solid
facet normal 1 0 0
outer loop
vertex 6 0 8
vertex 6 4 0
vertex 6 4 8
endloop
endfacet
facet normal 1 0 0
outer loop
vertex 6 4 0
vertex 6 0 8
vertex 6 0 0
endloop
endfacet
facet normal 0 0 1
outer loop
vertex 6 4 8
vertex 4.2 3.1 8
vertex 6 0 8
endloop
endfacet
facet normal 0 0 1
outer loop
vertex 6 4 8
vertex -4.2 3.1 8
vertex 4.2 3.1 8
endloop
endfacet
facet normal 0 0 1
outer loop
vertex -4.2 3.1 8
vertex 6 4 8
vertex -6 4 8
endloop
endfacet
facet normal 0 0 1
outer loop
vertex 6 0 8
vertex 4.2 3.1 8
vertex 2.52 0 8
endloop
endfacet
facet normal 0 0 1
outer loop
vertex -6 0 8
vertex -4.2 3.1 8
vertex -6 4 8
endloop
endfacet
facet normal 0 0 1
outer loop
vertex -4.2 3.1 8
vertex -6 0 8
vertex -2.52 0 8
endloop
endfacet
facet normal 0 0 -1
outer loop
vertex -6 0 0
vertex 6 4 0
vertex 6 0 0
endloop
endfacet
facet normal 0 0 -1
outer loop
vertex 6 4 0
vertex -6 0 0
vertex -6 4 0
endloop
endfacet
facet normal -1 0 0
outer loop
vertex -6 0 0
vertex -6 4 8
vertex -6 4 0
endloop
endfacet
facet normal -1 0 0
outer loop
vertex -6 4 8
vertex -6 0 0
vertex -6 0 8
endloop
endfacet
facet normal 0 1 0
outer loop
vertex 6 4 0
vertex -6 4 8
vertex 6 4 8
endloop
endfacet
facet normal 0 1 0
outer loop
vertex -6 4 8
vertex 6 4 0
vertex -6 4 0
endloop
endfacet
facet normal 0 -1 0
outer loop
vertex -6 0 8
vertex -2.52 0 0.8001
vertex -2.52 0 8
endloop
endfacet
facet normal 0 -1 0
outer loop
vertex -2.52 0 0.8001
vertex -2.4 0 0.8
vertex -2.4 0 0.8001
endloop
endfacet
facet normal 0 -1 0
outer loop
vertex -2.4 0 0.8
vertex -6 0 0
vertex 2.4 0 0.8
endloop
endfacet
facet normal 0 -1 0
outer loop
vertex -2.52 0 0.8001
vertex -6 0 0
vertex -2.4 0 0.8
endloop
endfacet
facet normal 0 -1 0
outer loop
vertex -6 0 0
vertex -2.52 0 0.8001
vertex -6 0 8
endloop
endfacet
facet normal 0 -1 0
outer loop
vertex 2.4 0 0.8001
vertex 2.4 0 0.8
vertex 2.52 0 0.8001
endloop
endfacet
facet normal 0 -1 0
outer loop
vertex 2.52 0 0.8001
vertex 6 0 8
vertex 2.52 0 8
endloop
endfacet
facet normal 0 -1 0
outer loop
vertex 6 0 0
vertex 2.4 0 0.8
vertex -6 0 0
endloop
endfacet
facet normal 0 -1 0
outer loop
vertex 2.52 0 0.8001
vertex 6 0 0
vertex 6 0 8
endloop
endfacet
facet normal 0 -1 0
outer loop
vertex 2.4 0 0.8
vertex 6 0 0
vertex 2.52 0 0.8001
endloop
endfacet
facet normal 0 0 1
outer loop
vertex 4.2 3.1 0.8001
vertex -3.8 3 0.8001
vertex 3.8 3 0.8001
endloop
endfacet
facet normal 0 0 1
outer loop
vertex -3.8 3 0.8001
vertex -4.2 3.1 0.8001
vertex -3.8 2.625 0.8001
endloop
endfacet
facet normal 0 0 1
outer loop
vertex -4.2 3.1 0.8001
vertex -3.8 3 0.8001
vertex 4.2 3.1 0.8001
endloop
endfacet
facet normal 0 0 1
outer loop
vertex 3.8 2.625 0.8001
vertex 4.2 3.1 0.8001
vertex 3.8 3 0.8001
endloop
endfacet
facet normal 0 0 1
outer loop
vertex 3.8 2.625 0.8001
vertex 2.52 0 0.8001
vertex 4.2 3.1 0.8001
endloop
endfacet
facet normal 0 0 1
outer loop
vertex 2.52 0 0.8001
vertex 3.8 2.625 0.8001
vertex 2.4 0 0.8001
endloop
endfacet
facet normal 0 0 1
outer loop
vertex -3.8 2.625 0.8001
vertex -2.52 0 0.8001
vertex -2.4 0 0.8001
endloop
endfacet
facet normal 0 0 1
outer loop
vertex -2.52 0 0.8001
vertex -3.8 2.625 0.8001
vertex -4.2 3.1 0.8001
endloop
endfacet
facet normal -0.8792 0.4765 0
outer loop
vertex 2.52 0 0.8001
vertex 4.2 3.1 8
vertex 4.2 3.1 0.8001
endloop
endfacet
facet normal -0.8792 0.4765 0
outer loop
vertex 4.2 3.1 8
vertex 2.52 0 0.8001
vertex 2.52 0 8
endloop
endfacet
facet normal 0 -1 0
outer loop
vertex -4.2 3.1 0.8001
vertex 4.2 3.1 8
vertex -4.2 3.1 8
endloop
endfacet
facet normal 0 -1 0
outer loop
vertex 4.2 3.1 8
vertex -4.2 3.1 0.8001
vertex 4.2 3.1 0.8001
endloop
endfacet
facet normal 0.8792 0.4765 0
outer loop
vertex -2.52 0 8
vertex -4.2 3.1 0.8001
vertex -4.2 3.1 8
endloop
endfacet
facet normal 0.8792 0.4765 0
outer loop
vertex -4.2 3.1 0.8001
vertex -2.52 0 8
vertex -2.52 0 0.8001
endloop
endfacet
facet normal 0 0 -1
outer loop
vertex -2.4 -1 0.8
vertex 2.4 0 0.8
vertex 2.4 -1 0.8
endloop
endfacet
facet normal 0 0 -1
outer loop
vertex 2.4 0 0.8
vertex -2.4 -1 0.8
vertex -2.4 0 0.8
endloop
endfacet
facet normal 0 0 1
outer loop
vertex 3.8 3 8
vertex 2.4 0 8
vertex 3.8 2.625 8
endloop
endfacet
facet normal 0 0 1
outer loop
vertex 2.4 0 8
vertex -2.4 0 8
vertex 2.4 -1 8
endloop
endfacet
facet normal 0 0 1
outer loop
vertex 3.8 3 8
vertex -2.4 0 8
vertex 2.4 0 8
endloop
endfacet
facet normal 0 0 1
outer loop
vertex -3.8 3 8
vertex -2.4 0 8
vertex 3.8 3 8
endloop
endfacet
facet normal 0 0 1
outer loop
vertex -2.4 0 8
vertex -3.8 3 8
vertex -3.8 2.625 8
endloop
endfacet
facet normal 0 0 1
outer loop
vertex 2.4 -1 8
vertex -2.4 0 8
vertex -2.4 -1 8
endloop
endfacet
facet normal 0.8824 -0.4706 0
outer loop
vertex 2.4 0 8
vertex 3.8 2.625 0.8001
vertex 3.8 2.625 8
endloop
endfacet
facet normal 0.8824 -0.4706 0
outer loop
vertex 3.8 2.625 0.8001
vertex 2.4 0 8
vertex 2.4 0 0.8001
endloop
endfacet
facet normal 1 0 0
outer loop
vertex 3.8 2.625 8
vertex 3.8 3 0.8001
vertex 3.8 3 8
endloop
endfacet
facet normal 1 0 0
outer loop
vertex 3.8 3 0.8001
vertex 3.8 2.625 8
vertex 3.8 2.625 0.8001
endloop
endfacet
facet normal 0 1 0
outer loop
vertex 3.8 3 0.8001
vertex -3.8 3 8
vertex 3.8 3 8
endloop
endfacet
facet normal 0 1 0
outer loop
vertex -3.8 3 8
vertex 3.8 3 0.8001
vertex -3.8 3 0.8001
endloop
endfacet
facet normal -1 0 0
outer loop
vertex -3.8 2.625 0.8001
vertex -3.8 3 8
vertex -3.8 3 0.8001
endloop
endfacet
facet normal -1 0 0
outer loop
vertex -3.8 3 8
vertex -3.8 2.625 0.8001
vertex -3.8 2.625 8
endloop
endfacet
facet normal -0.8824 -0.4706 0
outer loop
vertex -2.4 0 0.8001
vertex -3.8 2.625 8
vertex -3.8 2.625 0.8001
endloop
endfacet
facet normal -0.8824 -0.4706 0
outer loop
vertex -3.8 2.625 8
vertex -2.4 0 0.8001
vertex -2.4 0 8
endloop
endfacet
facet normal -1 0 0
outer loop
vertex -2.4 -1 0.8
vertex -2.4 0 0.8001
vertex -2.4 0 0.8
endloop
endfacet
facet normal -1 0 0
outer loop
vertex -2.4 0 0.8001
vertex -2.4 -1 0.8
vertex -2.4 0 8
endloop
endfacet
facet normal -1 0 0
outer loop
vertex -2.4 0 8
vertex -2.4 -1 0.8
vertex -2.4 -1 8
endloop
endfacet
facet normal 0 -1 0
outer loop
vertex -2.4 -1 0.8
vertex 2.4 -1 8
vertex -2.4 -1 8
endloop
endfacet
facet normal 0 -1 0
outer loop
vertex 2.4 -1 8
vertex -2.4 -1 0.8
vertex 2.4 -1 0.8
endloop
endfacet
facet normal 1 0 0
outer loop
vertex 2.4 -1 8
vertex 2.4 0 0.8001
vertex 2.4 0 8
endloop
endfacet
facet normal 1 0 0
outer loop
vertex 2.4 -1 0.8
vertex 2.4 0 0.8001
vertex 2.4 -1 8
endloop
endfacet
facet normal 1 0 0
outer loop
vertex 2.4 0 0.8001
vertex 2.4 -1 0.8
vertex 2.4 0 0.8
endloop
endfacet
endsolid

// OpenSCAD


pinDepth = 3;
pinWidth = 8;
tailHeight = 8;

pinWidthFraction = 0.4;
pinHeightFraction = 0.9;

overhangDepth = 1;
overhangWidth = 2;

fitTolerance = 0.4;

cornerTrim = 0.4;

pinOrTail = "both"; // [pin,tail,both]


makeJoint();



module makeJoint()
{
    if( pinOrTail == "pin" )
    {
        DovetailPin( pinDepth, pinWidth, tailHeight, pinWidthFraction, pinHeightFraction, overhangDepth, cornerTrim );
    }
    else if( pinOrTail == "tail" )
    {
        DovetailTail( pinDepth, pinWidth, tailHeight, pinWidthFraction, pinHeightFraction, overhangDepth, overhangWidth, fitTolerance );
    }
    else
    {
        DovetailPin( pinDepth, pinWidth, tailHeight, pinWidthFraction, pinHeightFraction, overhangDepth, cornerTrim );

        DovetailTail( pinDepth, pinWidth, tailHeight, pinWidthFraction, pinHeightFraction, overhangDepth, overhangWidth, fitTolerance );
    }     
}



module DovetailPin( depth,
                    width,
                    height,
                    wedgeWidthFraction,
                    wedgeHeightFraction,
                    overhangDepth,
                    cornerTrim = 0 )
{
    rectangleWidth = width* (1-wedgeWidthFraction);

    //  Compute how much of the corners to trim off to improve fit
    
    angle = atan2((width - rectangleWidth)/2, depth );
    trimmedY = ((( width - rectangleWidth)/2) - cornerTrim ) / tan( angle );
    
    translate([0, depth/2, height*(1-wedgeHeightFraction)])   
    linear_extrude(height*wedgeHeightFraction)
    {
        polygon( points=[[-rectangleWidth/2,-depth/2],
                         [-rectangleWidth/2, -((depth/2) + overhangDepth)],
                         [rectangleWidth/2,  -((depth/2) + overhangDepth)],
                         [rectangleWidth/2,-depth/2],
                         [(width-cornerTrim)/2,trimmedY/2],
                         [(width-cornerTrim)/2,depth/2],
                         [-(width-cornerTrim)/2,depth/2],
                         [-(width-cornerTrim)/2,trimmedY/2]],
                 paths=[[0,1,2,3,4,5,6,7]]);    
    }
}



module DovetailTail( depth,
                     width,
                     height,
                     wedgeWidthFraction,
                     wedgeHeightFraction,
                     overhangDepth,
                     overhangWidth,
                     fitTolerance )
{
    difference()
    {
        translate([ 0, (depth+overhangDepth)/2, (height/2)])
        cube([width+(overhangWidth*2),depth+overhangDepth,height],true);
        
        scale([1+(fitTolerance/width),1+(fitTolerance/(4*depth)),1.0001])
        {
            DovetailPin( depth, width, height, wedgeWidthFraction, wedgeHeightFraction, overhangDepth );
        }
    }
}








